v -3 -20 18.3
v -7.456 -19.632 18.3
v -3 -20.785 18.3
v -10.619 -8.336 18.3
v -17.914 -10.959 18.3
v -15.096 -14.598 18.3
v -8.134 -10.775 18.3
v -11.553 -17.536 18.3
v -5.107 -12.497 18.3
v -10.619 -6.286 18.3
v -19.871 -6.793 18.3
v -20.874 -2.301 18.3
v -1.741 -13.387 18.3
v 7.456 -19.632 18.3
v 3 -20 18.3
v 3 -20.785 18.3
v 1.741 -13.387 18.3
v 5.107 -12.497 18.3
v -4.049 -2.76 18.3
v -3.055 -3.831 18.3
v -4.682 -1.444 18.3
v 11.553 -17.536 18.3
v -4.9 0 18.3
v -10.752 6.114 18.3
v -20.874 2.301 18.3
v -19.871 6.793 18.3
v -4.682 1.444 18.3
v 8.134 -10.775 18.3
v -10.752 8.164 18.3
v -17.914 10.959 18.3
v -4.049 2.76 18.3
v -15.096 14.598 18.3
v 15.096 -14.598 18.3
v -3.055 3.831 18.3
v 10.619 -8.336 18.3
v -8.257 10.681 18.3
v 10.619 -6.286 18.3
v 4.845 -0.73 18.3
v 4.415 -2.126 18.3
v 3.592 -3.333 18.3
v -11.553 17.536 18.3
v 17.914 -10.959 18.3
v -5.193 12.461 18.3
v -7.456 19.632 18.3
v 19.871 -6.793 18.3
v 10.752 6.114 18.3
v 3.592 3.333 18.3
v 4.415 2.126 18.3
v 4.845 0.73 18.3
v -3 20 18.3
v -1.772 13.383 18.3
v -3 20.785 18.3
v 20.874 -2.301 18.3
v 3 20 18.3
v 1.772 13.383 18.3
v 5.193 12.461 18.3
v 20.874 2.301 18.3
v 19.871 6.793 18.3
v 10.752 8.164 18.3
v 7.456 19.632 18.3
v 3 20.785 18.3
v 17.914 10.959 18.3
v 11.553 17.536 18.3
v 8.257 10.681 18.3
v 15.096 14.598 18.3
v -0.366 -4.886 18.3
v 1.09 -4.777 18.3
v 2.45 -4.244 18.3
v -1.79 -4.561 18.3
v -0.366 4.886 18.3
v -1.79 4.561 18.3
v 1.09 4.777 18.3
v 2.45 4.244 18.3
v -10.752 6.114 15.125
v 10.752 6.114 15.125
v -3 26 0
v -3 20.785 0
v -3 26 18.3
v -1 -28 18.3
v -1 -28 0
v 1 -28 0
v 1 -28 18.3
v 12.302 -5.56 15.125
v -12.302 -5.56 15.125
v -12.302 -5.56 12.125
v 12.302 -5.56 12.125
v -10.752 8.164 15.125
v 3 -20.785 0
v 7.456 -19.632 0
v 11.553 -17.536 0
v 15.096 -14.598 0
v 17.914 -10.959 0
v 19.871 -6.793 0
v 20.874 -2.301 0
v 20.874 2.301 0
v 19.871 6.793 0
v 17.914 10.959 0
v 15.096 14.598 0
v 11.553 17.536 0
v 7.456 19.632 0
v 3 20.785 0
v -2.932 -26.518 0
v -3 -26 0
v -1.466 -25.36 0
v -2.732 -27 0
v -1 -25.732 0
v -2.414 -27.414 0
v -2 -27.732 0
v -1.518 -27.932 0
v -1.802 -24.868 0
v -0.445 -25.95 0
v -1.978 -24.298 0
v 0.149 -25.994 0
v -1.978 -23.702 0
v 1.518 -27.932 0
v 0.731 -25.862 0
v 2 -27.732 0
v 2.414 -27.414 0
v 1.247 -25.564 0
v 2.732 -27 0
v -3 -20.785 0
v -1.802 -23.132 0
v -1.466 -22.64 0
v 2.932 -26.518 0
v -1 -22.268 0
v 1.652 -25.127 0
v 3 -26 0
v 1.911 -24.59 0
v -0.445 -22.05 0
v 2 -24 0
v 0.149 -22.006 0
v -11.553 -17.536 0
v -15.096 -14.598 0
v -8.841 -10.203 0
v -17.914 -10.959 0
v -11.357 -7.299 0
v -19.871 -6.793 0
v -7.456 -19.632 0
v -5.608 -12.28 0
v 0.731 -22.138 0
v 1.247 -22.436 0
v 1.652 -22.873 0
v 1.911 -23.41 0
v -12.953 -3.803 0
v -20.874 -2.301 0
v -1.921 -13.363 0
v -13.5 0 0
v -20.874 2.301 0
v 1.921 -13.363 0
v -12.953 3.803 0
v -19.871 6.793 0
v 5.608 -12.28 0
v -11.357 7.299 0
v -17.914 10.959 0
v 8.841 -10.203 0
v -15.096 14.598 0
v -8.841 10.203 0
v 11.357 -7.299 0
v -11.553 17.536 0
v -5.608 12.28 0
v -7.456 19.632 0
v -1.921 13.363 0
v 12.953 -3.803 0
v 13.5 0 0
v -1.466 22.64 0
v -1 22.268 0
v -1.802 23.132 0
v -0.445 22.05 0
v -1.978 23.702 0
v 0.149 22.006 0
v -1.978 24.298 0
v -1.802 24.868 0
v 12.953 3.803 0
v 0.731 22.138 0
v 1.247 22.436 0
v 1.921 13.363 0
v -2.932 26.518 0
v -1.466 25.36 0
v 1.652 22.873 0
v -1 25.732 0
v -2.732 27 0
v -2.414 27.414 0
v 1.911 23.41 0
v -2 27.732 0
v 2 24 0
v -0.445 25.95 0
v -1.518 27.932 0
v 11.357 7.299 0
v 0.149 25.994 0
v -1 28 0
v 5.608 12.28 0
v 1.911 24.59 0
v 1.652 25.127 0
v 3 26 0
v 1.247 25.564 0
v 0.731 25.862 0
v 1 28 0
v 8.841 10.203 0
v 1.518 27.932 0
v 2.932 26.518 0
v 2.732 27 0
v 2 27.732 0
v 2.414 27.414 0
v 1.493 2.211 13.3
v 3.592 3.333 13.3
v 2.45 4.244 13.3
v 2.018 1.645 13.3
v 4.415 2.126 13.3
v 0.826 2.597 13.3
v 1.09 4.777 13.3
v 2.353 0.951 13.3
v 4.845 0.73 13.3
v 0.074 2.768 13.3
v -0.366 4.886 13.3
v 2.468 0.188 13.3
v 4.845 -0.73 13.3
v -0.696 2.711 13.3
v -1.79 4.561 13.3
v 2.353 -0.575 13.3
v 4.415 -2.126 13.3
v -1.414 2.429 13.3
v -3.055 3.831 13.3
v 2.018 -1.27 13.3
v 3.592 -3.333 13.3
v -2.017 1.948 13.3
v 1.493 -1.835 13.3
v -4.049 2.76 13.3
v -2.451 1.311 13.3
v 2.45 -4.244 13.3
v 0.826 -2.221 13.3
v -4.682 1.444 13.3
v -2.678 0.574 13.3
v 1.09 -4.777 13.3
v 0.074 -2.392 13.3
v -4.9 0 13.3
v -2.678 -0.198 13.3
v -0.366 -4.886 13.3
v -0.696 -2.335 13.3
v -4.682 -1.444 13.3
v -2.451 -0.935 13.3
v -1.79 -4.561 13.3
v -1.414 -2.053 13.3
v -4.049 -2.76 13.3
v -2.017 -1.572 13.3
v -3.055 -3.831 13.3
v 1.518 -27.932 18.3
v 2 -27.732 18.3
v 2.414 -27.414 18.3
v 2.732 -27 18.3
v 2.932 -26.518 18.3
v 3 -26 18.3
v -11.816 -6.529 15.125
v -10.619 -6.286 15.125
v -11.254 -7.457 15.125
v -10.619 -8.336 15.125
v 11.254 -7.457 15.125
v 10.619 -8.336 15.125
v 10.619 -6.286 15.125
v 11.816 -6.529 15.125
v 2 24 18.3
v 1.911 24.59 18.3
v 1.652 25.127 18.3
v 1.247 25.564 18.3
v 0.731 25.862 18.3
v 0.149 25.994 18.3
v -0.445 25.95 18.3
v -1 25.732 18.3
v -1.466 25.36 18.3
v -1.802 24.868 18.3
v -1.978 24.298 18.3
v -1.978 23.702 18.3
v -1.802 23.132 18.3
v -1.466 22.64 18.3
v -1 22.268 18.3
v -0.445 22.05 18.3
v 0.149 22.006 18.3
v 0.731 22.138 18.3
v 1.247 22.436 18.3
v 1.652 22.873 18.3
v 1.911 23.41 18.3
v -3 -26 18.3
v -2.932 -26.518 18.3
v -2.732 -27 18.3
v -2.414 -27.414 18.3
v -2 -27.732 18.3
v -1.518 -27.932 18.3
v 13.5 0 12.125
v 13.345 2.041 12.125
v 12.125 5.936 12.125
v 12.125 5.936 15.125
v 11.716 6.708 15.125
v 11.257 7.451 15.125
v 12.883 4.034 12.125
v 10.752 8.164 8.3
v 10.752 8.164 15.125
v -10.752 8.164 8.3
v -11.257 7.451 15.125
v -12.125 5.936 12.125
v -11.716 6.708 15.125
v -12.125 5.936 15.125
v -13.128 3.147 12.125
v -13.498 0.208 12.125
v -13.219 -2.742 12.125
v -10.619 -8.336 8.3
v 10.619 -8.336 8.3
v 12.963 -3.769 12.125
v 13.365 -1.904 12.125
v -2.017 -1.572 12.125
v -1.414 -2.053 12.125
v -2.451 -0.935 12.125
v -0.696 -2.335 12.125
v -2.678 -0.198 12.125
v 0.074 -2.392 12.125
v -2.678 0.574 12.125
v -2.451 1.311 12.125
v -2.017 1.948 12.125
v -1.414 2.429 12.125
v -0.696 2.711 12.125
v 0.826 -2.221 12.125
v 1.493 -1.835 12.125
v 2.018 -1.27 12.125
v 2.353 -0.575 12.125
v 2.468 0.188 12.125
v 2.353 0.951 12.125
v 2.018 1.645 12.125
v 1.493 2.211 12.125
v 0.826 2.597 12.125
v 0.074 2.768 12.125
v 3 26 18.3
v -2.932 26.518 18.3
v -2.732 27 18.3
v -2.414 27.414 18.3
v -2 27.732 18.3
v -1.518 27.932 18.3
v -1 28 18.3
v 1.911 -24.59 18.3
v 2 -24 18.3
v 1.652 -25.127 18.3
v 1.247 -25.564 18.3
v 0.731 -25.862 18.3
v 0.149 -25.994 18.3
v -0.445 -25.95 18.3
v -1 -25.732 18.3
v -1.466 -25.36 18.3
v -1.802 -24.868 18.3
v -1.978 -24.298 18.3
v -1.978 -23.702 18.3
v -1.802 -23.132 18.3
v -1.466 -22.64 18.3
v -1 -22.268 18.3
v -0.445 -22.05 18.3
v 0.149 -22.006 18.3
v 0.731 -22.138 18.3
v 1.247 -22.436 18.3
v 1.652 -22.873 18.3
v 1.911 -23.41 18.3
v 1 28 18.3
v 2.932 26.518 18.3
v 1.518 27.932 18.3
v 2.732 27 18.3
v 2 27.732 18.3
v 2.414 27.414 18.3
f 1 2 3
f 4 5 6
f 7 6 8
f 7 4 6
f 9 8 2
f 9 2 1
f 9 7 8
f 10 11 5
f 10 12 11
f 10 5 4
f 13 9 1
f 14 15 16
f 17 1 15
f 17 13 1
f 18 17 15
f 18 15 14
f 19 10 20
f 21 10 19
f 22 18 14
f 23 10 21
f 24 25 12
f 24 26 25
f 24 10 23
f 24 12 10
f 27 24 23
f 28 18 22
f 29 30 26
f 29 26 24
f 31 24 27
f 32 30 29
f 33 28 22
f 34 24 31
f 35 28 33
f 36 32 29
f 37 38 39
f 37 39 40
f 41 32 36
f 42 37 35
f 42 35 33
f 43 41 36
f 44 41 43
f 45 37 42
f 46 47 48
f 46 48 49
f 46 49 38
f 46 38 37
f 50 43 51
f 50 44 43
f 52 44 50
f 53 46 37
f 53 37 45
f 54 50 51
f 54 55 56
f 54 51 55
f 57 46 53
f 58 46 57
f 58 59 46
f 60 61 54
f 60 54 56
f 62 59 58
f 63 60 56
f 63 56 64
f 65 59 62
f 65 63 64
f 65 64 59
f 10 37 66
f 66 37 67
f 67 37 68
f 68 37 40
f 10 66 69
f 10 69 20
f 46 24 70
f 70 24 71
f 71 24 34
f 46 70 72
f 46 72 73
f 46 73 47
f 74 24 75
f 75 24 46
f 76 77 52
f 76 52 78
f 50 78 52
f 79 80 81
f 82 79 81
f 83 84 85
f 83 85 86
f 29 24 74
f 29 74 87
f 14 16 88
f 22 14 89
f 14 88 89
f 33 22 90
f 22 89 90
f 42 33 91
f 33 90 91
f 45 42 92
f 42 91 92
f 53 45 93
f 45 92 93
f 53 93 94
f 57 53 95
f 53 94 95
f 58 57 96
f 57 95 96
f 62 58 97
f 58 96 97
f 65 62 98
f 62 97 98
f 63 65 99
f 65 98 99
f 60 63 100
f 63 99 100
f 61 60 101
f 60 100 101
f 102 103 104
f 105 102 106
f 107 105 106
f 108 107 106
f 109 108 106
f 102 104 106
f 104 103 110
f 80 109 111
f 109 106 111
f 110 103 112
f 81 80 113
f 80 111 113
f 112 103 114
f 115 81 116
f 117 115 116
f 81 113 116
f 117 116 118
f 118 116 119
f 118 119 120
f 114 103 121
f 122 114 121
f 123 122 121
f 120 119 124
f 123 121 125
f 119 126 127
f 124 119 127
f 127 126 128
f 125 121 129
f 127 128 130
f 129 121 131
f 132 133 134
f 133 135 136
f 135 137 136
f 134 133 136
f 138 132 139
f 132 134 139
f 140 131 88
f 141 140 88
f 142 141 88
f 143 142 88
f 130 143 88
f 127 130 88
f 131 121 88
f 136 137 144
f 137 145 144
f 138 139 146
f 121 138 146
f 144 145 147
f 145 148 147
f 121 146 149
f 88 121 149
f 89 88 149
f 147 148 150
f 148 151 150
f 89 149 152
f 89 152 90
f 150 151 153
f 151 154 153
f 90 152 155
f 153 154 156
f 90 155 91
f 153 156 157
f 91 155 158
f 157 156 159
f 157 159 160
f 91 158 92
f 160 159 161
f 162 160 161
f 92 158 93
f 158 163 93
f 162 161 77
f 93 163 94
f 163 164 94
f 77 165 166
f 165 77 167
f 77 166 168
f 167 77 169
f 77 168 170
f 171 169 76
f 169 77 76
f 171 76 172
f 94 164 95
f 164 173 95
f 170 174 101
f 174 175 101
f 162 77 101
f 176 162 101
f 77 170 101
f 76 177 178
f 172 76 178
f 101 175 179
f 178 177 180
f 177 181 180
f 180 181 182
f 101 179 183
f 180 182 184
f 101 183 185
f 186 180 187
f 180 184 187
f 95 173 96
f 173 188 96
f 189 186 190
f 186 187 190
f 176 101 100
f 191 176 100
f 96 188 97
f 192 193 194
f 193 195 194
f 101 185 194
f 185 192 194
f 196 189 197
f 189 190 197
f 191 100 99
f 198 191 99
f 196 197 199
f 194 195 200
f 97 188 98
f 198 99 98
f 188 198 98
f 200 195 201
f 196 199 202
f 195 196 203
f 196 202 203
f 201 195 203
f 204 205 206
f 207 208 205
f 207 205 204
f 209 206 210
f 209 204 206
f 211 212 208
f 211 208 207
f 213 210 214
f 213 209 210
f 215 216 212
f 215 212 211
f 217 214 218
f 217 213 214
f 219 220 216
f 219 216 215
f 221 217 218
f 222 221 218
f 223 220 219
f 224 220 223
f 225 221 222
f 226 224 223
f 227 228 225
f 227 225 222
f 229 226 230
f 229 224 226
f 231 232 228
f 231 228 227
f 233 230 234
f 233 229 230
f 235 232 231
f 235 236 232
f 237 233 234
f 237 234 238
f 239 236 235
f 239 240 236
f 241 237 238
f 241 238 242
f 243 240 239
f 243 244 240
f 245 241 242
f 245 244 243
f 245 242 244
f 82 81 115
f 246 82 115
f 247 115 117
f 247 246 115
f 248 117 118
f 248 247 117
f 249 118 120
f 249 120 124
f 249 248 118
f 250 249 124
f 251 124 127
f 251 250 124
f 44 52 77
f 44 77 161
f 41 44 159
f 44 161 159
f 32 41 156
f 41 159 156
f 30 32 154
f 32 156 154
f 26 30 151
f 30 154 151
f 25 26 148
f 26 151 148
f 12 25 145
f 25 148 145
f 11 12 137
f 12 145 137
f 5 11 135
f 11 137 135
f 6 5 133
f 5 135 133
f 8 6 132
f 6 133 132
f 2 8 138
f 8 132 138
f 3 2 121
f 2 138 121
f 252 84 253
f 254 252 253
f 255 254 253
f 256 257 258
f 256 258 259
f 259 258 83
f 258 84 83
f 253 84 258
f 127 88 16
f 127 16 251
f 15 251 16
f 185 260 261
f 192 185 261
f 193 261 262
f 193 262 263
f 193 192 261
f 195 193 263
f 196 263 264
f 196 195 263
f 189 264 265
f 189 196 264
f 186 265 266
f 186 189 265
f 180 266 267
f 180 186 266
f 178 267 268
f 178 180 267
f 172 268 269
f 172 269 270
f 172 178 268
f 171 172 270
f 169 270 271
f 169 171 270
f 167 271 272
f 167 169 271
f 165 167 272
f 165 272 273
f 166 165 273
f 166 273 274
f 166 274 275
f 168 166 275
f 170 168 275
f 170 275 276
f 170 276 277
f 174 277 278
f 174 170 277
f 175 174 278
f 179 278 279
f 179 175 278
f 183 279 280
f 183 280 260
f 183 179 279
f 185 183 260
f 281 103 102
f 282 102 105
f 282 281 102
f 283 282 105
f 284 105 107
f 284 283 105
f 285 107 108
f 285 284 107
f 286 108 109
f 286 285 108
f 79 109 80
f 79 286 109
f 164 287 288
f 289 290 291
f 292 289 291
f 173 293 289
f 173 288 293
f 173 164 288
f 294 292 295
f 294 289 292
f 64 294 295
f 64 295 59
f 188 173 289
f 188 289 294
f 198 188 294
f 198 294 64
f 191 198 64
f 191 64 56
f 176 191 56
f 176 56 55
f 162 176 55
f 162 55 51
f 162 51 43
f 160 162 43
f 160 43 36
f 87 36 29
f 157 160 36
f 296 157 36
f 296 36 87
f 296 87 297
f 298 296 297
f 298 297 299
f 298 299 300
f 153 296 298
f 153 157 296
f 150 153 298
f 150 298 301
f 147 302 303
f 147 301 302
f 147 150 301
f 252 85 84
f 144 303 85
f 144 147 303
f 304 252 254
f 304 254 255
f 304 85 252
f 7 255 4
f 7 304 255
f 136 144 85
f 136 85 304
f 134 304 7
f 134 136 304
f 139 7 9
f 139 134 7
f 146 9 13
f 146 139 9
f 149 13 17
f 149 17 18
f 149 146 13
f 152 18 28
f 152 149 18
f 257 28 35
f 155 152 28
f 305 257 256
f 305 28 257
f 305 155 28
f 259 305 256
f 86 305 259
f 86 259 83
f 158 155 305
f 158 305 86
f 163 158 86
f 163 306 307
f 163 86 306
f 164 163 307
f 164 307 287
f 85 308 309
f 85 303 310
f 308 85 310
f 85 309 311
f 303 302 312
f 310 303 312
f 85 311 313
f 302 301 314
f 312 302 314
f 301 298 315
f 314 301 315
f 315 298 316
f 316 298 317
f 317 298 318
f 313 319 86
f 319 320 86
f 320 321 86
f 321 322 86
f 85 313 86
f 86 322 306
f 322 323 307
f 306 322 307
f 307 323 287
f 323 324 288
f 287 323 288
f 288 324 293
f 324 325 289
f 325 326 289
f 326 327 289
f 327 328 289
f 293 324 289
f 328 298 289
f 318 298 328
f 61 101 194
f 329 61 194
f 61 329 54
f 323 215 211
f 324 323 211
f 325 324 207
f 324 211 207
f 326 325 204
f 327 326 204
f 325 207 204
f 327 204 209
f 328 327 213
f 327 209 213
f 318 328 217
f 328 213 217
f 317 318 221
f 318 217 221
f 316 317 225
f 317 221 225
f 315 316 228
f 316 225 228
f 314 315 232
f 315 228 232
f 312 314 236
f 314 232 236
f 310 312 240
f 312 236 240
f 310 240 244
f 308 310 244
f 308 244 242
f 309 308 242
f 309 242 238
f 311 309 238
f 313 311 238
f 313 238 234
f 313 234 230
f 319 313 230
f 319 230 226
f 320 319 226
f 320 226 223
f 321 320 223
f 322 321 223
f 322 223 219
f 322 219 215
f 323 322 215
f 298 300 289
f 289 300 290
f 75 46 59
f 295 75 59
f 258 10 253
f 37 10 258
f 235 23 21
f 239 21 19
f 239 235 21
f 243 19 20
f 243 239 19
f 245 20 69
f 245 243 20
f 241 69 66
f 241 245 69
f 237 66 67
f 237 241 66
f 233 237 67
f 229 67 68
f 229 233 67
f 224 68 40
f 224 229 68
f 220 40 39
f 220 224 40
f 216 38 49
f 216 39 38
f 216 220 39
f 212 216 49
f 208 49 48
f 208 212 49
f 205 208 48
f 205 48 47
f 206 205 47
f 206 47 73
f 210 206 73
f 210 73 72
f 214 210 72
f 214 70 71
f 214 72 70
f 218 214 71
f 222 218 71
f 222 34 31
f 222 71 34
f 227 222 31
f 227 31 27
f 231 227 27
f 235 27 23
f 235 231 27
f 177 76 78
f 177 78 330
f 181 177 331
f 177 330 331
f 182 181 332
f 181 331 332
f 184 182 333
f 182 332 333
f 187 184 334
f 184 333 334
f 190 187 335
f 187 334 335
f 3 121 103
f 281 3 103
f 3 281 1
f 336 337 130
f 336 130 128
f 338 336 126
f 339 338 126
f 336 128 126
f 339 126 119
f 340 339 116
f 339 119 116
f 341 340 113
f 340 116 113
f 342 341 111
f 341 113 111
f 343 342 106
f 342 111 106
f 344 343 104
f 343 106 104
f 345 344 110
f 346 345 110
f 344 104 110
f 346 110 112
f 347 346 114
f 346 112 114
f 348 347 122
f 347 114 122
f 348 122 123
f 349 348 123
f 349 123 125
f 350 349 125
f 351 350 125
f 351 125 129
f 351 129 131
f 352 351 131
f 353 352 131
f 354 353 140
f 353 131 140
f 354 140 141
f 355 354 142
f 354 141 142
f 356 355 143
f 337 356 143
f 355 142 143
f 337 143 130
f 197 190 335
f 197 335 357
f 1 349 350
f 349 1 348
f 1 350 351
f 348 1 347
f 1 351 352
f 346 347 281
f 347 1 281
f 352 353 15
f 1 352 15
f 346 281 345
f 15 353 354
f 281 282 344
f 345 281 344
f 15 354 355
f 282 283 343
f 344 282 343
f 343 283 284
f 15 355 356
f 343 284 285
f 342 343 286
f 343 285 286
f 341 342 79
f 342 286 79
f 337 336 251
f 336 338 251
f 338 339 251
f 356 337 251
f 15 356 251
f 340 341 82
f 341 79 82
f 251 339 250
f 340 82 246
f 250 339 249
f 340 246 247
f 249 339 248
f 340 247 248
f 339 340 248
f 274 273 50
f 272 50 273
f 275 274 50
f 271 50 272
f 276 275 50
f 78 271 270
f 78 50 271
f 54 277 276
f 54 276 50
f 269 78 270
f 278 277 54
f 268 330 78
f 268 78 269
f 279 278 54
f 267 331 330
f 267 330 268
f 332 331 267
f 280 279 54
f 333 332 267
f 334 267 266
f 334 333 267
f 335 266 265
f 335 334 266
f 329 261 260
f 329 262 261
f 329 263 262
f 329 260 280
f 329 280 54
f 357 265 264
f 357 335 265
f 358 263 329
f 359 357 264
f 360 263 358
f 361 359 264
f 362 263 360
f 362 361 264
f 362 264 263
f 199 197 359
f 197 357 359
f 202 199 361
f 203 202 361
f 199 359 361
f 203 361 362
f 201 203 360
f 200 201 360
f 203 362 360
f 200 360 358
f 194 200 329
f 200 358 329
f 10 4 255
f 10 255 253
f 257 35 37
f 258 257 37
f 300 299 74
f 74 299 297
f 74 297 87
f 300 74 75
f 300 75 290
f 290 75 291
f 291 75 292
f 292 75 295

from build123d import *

# Parameters (mm, degrees)
SKETCH1_R               = 21
SKETCH1_R_2             = 13.5
BOSS_EXTRUDE1_DEPTH     = 18.3
BOSS_EXTRUDE3_START     = -3.175
BOSS_EXTRUDE3_DEPTH     = 3.175
SKETCH8_W               = 29.000689647
SKETCH8_H               = 11.495244731
SKETCH8_R               = 2.5875
BOSS_EXTRUDE4_DEPTH     = 3
CUT_EXTRUDE2_DEPTH      = 35.883950464
CUT_EXTRUDE2_DEPTH_BACK = 5
SKETCH7_R               = 4.9
BOSS_EXTRUDE5_START     = -18.3
SKETCH12_W              = 6
SKETCH12_H              = 8
SKETCH12_R              = 2
BOSS_EXTRUDE5_DEPTH     = 18.3001
FILLET1_R               = 2
SKETCH13_W              = 21.503284362
SKETCH13_H              = 2.04991851
SKETCH13_W_2            = 21.237930752
SKETCH13_H_2            = 2.05
CUT_EXTRUDE3_DEPTH      = 10


with BuildPart() as part:
    # Sketch1 → Boss-Extrude1 (new body)
    with BuildSketch(Plane.XY):
        Circle(SKETCH1_R)
        Circle(SKETCH1_R_2, mode=Mode.SUBTRACT)
    extrude(amount=BOSS_EXTRUDE1_DEPTH)

    # Sketch4 → Boss-Extrude3 (add)
    with BuildSketch(Plane.XY.offset(18.3).offset(BOSS_EXTRUDE3_START)):
        with BuildLine():
            Line((10.751642181, 8.164079275), (-10.751642181, 8.164079275))
            ThreePointArc((-10.751642181, 8.164079275), (-13.49956358, -0.10855024), (-10.618965376, -8.335920725))
            Line((-10.618965376, -8.335920725), (10.618965376, -8.335920725))
            ThreePointArc((10.618965376, -8.335920725), (13.49956358, -0.10855024), (10.751642181, 8.164079275))
        make_face()
    extrude(amount=BOSS_EXTRUDE3_DEPTH)

    # Sketch8 → Boss-Extrude4 (add)
    with BuildSketch(Plane.XY.offset(15.125)):
        with Locations((-0.119782029, 0.187903113)):
            Rectangle(SKETCH8_W, SKETCH8_H)
        with Locations((-0.11978203, 0.187903113)):
            Circle(SKETCH8_R, mode=Mode.SUBTRACT)
    extrude(amount=-BOSS_EXTRUDE4_DEPTH)

    # Sketch7 → Cut-Extrude2 (cut, two sides: drawn at the far end of the back side and taken through both)
    with BuildSketch(Plane.XY.offset(18.3).offset(-CUT_EXTRUDE2_DEPTH_BACK)):
        with Locations(Location((0, 0, 0), (0, 0, 180))):
            Circle(SKETCH7_R)
    extrude(amount=CUT_EXTRUDE2_DEPTH + CUT_EXTRUDE2_DEPTH_BACK, mode=Mode.SUBTRACT)

    # Sketch12 → Boss-Extrude5 (add)
    with BuildSketch(Plane.XY.offset(18.3).offset(BOSS_EXTRUDE5_START)):
        with Locations((0, 24)):
            Rectangle(SKETCH12_W, SKETCH12_H)
        with Locations((0, 24)):
            Circle(SKETCH12_R, mode=Mode.SUBTRACT)
    boss_extrude5 = extrude(amount=BOSS_EXTRUDE5_DEPTH)

    # Mirror3: Boss-Extrude5 across plane
    add(boss_extrude5.mirror(Plane.ZX))

    # Fillet1
    fillet1_edges = [part.edges().sort_by_distance(p)[0] for p in [
        (3, 28, 9.15005),
        (-3, 28, 9.15005),
        (-3, -28, 9.15005),
        (3, -28, 9.15005),
    ]]
    fillet(fillet1_edges, radius=FILLET1_R)

    # Sketch13 → Cut-Extrude3 (cut)
    with BuildSketch(Plane.XY.offset(18.3)):
        with Locations((0, 7.13912002)):
            Rectangle(SKETCH13_W, SKETCH13_H)
        with Locations((0, -7.310920725)):
            Rectangle(SKETCH13_W_2, SKETCH13_H_2)
    extrude(amount=-CUT_EXTRUDE3_DEPTH, mode=Mode.SUBTRACT)


solid = part.part
